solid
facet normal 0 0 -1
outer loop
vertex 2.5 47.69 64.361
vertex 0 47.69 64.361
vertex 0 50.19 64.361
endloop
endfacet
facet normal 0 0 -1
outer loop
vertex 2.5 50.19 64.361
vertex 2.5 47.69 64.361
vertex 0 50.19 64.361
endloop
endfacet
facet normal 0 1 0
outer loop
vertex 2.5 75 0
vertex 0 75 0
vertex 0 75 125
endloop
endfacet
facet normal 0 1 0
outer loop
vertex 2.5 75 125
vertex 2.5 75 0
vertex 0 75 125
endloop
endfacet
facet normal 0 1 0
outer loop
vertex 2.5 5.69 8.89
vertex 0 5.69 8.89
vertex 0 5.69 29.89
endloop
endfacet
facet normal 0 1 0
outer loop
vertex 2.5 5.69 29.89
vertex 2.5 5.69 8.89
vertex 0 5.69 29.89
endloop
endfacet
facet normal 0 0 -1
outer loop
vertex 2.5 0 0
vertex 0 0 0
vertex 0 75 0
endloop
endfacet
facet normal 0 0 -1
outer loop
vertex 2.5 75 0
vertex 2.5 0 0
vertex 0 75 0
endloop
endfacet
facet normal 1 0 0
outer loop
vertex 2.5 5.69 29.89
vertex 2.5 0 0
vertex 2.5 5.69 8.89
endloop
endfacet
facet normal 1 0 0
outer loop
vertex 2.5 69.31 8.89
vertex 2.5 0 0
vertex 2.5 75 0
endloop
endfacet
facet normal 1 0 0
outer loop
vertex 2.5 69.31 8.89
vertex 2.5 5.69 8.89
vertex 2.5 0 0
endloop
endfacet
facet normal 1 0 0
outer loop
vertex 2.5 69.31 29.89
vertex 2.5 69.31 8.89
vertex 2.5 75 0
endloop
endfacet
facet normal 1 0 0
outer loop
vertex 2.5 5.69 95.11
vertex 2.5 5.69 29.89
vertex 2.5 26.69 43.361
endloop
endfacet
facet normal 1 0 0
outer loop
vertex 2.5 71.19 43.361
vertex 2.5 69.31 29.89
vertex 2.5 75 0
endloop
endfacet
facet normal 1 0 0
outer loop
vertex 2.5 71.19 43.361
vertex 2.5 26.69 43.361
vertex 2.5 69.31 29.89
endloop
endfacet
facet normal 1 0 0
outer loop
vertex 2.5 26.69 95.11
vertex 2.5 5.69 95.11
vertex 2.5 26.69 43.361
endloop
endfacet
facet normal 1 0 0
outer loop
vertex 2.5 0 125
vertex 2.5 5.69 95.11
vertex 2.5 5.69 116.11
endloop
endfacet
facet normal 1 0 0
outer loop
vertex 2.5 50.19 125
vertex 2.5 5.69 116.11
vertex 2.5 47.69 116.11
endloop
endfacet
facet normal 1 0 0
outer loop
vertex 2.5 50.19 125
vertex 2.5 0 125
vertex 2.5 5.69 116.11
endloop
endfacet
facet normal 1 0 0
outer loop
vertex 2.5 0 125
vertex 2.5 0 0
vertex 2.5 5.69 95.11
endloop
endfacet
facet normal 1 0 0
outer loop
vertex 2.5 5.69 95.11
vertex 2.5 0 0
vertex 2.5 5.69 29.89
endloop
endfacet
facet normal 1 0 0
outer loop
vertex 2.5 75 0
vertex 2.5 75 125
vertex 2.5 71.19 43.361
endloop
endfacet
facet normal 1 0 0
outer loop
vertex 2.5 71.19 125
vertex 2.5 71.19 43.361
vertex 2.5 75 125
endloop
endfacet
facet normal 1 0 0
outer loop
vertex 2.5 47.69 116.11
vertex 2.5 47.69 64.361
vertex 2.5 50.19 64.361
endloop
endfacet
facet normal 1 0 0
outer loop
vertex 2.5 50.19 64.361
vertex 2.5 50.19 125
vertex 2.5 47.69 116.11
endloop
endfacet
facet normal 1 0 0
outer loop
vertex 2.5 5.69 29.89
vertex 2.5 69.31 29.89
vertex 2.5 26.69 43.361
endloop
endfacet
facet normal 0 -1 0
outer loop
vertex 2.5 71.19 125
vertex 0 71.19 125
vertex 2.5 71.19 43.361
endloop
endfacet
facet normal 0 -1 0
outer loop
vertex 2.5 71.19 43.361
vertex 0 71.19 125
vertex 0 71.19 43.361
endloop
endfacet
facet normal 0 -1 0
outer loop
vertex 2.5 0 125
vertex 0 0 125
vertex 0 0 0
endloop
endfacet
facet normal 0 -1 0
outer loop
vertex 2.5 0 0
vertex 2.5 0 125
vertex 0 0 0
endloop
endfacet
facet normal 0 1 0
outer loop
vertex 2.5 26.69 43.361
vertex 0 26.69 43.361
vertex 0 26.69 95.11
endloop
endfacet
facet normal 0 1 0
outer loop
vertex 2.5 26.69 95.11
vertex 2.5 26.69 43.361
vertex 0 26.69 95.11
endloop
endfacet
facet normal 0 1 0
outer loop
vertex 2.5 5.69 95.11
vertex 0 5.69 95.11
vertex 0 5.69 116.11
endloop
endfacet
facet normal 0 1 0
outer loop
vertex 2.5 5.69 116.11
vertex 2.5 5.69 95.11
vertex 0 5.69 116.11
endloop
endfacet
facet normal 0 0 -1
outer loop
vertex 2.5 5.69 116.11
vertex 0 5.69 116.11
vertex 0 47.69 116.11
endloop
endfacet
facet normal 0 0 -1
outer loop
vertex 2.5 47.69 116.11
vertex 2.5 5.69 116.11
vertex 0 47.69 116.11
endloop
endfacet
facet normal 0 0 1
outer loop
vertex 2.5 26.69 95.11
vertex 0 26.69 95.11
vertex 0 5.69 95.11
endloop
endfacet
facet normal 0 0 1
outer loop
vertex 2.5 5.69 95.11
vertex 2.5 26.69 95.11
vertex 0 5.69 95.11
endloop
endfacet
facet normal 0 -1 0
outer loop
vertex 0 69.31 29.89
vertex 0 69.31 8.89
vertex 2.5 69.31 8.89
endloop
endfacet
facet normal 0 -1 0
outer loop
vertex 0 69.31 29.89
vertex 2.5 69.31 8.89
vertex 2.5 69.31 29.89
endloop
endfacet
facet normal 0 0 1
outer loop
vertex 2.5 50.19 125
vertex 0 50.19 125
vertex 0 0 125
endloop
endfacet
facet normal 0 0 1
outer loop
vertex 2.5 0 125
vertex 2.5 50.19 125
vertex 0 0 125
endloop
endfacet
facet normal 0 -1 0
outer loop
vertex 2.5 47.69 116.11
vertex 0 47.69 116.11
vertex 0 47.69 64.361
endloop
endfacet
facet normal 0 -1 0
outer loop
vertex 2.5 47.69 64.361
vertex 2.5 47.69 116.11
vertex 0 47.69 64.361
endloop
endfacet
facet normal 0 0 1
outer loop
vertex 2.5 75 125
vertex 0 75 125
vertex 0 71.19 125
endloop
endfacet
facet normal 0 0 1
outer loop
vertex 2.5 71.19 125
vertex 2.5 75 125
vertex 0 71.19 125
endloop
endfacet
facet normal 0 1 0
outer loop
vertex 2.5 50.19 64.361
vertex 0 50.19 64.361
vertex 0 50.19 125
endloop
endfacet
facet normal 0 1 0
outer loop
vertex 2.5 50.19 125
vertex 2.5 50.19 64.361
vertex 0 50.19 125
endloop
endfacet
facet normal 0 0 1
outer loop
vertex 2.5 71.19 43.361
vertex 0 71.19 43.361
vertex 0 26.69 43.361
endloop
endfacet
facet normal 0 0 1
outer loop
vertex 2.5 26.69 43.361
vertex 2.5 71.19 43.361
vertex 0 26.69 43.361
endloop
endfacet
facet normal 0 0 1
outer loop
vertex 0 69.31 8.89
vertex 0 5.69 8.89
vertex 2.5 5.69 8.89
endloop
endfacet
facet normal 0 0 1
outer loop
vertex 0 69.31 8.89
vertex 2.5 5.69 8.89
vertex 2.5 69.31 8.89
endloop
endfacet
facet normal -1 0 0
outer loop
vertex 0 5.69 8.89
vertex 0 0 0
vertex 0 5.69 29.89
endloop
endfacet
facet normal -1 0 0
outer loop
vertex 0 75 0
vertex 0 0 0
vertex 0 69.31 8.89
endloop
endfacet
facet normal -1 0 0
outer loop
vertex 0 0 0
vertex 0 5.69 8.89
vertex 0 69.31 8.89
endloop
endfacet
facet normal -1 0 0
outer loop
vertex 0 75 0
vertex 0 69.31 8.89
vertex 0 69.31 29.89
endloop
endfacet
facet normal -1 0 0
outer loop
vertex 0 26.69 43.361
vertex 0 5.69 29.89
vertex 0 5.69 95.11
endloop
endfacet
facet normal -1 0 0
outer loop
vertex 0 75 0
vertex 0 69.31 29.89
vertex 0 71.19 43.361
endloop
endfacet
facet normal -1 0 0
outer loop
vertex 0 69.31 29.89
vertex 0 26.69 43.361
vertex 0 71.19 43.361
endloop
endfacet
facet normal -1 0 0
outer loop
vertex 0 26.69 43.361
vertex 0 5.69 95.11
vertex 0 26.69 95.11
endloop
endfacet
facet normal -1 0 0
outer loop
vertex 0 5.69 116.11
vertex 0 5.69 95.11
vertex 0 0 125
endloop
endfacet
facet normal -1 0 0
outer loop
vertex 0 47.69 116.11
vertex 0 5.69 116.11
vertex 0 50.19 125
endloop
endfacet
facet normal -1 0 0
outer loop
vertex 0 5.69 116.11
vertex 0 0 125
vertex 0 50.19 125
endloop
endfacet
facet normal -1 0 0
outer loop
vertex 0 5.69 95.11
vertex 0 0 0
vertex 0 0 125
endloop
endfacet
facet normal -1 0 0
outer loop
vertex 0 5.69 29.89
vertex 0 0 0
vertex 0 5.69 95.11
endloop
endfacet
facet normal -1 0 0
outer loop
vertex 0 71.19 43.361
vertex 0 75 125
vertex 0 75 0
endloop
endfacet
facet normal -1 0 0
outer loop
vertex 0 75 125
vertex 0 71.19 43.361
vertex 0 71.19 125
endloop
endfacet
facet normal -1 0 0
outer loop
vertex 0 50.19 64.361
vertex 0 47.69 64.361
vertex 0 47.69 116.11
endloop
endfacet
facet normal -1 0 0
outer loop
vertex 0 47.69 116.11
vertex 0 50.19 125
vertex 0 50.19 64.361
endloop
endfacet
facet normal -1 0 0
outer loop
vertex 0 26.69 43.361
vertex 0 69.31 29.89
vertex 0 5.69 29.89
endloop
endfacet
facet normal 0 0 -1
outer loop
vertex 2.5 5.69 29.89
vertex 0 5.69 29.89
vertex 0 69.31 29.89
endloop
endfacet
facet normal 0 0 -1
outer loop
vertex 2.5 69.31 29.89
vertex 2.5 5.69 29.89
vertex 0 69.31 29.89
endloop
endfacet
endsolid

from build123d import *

# Parameters (mm, degrees)
F0_W     = 63.619988
F0_H     = 21
F1_DEPTH = 2.5


with BuildPart() as f1:
    # F0 (on Right) → F1 (new body)
    with BuildSketch(Plane.YZ):
        Polygon((0, 125), (0, 0), (75, 0), (75, 125), (71.19, 125), (71.19, 43.36109), (71.19, 3.81), (3.81, 3.81), (3.81, 121.19), (44.505585, 121.19), (47.69, 121.19), (50.19, 121.19), (50.19, 125), (44.505585, 125), align=None)
        Polygon((71.19, 3.81), (71.19, 43.36109), (26.69, 43.36109), (26.69, 95.11), (5.69, 95.11), (5.69, 116.11), (47.69, 116.11), (47.69, 121.19), (44.505585, 121.19), (3.81, 121.19), (3.81, 3.81), align=None)
        with Locations((37.5, 19.39)):
            Rectangle(F0_W, F0_H, mode=Mode.SUBTRACT)
        Polygon((50.19, 64.36109), (50.19, 121.19), (47.69, 121.19), (47.69, 116.11), (47.69, 64.36109), align=None)
    extrude(amount=F1_DEPTH)


solid = f1.part
